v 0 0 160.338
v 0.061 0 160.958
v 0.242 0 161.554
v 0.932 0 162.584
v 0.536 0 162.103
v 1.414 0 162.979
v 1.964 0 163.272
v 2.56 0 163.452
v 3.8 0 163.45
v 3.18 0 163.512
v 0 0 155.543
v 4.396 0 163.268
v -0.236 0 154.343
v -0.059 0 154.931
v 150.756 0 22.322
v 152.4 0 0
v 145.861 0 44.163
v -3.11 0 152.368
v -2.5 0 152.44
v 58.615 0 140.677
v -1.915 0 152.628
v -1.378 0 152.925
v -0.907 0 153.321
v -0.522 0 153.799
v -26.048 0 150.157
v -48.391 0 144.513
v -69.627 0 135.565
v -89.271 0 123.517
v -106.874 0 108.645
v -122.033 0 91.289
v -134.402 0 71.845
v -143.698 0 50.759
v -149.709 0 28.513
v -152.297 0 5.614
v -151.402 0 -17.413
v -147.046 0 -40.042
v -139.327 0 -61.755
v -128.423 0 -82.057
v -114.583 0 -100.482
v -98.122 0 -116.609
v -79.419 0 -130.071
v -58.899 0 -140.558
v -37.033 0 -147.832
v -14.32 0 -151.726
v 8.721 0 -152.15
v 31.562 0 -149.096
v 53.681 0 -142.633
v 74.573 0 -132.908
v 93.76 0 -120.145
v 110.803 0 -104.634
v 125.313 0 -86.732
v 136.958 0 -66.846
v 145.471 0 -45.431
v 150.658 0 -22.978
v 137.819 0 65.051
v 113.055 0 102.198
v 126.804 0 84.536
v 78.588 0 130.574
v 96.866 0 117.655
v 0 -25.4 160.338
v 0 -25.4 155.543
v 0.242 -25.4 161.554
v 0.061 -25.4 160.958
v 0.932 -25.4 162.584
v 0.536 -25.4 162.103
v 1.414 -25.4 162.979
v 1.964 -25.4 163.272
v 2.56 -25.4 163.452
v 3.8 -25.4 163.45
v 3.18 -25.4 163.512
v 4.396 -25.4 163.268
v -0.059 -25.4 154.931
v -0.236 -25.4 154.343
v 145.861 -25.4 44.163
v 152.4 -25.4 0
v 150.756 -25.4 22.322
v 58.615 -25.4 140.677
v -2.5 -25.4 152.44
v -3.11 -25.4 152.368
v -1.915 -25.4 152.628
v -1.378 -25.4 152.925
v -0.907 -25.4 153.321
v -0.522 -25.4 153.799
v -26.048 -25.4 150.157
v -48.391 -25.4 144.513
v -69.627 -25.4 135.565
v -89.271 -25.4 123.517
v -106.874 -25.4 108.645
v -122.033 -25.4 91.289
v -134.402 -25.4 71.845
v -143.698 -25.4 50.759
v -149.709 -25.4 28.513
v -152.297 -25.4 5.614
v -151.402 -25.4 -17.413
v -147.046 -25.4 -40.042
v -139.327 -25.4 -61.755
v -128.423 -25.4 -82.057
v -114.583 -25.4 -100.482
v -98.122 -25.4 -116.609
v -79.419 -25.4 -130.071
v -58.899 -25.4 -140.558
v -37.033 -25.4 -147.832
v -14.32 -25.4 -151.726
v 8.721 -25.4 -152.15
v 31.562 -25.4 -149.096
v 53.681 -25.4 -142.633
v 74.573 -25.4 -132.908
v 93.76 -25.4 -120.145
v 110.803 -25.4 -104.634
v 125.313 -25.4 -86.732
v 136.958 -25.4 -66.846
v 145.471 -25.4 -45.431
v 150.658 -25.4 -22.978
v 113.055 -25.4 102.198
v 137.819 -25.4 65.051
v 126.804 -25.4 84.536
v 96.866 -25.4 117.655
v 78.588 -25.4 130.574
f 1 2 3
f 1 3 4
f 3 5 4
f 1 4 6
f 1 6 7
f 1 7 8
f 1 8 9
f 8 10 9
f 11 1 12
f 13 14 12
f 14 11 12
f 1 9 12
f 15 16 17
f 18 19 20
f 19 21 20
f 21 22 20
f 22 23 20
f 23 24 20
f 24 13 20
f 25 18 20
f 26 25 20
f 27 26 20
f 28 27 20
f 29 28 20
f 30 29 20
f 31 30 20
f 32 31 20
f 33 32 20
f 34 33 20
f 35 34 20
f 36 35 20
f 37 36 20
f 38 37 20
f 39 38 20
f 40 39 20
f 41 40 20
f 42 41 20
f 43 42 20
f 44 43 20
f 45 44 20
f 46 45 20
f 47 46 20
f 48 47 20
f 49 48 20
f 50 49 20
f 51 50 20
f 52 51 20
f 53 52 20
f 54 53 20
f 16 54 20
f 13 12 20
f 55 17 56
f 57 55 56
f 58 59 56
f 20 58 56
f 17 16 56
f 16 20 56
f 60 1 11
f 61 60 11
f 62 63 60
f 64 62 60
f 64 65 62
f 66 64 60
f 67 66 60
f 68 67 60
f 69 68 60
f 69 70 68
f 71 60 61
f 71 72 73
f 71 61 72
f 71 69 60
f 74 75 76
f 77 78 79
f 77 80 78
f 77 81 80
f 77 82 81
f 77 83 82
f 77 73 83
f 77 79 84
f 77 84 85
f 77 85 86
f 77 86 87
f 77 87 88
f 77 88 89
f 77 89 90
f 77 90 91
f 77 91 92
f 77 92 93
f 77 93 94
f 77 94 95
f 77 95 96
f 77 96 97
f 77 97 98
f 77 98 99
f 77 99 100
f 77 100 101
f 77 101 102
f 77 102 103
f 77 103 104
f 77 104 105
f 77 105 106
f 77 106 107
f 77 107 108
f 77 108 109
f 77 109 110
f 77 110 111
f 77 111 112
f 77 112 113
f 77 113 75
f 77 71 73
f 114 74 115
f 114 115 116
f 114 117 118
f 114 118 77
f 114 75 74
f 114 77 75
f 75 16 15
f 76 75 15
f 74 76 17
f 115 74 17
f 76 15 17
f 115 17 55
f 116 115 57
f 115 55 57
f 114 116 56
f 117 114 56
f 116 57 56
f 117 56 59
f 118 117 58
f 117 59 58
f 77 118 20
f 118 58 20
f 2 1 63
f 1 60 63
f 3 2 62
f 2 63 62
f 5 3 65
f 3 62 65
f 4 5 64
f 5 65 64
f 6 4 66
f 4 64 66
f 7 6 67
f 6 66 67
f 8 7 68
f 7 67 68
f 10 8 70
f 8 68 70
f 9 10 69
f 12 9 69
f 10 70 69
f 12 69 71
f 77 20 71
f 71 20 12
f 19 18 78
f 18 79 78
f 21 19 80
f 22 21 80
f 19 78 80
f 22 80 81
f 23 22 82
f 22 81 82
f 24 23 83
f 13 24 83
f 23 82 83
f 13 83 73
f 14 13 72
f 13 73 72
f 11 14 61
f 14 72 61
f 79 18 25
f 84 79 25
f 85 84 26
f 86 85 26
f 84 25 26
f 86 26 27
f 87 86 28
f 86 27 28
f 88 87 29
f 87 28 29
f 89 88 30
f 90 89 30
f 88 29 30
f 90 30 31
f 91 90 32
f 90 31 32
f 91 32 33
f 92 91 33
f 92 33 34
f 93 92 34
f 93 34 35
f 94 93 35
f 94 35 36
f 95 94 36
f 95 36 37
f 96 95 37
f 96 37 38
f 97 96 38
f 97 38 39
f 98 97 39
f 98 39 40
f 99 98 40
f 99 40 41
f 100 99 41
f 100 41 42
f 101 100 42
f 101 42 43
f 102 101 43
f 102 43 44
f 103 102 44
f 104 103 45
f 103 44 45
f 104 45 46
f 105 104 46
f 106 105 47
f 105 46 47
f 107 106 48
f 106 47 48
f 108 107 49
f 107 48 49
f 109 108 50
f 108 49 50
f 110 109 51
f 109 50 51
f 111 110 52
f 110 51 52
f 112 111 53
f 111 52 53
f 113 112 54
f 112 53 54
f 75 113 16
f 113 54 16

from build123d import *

# Parameters (mm, degrees)
F1_DEPTH = 25.4
F2_R     = 3.175
F3_R     = 3.175


with BuildPart() as f1:
    # F0 (on Front) → F1 (new body)
    with BuildSketch(Plane.XZ):
        with BuildLine():
            ThreePointArc((0, 152.4), (-107.763073, -107.763073), (152.4, 0))
            ThreePointArc((152.4, 0), (126.804465, 84.53631), (58.615385, 140.676923))
            ThreePointArc((58.615385, 140.676923), (29.888099, 149.440495), (0, 152.4))
        make_face()
        with BuildLine():
            ThreePointArc((0, 152.4), (29.888099, 149.440495), (58.615385, 140.676923))
            Line((58.615385, 140.676923), (0, 165.1))
            Line((0, 165.1), (0, 152.4))
        make_face()
    extrude(amount=F1_DEPTH)

    # F2
    f2_edges = [f1.edges().sort_by_distance(p)[0] for p in [
        (0, -12.7, 152.4),
    ]]
    fillet(f2_edges, radius=F2_R)

    # F3
    f3_edges = [f1.edges().sort_by_distance(p)[0] for p in [
        (0, -12.7, 165.1),
    ]]
    fillet(f3_edges, radius=F3_R)


solid = f1.part
